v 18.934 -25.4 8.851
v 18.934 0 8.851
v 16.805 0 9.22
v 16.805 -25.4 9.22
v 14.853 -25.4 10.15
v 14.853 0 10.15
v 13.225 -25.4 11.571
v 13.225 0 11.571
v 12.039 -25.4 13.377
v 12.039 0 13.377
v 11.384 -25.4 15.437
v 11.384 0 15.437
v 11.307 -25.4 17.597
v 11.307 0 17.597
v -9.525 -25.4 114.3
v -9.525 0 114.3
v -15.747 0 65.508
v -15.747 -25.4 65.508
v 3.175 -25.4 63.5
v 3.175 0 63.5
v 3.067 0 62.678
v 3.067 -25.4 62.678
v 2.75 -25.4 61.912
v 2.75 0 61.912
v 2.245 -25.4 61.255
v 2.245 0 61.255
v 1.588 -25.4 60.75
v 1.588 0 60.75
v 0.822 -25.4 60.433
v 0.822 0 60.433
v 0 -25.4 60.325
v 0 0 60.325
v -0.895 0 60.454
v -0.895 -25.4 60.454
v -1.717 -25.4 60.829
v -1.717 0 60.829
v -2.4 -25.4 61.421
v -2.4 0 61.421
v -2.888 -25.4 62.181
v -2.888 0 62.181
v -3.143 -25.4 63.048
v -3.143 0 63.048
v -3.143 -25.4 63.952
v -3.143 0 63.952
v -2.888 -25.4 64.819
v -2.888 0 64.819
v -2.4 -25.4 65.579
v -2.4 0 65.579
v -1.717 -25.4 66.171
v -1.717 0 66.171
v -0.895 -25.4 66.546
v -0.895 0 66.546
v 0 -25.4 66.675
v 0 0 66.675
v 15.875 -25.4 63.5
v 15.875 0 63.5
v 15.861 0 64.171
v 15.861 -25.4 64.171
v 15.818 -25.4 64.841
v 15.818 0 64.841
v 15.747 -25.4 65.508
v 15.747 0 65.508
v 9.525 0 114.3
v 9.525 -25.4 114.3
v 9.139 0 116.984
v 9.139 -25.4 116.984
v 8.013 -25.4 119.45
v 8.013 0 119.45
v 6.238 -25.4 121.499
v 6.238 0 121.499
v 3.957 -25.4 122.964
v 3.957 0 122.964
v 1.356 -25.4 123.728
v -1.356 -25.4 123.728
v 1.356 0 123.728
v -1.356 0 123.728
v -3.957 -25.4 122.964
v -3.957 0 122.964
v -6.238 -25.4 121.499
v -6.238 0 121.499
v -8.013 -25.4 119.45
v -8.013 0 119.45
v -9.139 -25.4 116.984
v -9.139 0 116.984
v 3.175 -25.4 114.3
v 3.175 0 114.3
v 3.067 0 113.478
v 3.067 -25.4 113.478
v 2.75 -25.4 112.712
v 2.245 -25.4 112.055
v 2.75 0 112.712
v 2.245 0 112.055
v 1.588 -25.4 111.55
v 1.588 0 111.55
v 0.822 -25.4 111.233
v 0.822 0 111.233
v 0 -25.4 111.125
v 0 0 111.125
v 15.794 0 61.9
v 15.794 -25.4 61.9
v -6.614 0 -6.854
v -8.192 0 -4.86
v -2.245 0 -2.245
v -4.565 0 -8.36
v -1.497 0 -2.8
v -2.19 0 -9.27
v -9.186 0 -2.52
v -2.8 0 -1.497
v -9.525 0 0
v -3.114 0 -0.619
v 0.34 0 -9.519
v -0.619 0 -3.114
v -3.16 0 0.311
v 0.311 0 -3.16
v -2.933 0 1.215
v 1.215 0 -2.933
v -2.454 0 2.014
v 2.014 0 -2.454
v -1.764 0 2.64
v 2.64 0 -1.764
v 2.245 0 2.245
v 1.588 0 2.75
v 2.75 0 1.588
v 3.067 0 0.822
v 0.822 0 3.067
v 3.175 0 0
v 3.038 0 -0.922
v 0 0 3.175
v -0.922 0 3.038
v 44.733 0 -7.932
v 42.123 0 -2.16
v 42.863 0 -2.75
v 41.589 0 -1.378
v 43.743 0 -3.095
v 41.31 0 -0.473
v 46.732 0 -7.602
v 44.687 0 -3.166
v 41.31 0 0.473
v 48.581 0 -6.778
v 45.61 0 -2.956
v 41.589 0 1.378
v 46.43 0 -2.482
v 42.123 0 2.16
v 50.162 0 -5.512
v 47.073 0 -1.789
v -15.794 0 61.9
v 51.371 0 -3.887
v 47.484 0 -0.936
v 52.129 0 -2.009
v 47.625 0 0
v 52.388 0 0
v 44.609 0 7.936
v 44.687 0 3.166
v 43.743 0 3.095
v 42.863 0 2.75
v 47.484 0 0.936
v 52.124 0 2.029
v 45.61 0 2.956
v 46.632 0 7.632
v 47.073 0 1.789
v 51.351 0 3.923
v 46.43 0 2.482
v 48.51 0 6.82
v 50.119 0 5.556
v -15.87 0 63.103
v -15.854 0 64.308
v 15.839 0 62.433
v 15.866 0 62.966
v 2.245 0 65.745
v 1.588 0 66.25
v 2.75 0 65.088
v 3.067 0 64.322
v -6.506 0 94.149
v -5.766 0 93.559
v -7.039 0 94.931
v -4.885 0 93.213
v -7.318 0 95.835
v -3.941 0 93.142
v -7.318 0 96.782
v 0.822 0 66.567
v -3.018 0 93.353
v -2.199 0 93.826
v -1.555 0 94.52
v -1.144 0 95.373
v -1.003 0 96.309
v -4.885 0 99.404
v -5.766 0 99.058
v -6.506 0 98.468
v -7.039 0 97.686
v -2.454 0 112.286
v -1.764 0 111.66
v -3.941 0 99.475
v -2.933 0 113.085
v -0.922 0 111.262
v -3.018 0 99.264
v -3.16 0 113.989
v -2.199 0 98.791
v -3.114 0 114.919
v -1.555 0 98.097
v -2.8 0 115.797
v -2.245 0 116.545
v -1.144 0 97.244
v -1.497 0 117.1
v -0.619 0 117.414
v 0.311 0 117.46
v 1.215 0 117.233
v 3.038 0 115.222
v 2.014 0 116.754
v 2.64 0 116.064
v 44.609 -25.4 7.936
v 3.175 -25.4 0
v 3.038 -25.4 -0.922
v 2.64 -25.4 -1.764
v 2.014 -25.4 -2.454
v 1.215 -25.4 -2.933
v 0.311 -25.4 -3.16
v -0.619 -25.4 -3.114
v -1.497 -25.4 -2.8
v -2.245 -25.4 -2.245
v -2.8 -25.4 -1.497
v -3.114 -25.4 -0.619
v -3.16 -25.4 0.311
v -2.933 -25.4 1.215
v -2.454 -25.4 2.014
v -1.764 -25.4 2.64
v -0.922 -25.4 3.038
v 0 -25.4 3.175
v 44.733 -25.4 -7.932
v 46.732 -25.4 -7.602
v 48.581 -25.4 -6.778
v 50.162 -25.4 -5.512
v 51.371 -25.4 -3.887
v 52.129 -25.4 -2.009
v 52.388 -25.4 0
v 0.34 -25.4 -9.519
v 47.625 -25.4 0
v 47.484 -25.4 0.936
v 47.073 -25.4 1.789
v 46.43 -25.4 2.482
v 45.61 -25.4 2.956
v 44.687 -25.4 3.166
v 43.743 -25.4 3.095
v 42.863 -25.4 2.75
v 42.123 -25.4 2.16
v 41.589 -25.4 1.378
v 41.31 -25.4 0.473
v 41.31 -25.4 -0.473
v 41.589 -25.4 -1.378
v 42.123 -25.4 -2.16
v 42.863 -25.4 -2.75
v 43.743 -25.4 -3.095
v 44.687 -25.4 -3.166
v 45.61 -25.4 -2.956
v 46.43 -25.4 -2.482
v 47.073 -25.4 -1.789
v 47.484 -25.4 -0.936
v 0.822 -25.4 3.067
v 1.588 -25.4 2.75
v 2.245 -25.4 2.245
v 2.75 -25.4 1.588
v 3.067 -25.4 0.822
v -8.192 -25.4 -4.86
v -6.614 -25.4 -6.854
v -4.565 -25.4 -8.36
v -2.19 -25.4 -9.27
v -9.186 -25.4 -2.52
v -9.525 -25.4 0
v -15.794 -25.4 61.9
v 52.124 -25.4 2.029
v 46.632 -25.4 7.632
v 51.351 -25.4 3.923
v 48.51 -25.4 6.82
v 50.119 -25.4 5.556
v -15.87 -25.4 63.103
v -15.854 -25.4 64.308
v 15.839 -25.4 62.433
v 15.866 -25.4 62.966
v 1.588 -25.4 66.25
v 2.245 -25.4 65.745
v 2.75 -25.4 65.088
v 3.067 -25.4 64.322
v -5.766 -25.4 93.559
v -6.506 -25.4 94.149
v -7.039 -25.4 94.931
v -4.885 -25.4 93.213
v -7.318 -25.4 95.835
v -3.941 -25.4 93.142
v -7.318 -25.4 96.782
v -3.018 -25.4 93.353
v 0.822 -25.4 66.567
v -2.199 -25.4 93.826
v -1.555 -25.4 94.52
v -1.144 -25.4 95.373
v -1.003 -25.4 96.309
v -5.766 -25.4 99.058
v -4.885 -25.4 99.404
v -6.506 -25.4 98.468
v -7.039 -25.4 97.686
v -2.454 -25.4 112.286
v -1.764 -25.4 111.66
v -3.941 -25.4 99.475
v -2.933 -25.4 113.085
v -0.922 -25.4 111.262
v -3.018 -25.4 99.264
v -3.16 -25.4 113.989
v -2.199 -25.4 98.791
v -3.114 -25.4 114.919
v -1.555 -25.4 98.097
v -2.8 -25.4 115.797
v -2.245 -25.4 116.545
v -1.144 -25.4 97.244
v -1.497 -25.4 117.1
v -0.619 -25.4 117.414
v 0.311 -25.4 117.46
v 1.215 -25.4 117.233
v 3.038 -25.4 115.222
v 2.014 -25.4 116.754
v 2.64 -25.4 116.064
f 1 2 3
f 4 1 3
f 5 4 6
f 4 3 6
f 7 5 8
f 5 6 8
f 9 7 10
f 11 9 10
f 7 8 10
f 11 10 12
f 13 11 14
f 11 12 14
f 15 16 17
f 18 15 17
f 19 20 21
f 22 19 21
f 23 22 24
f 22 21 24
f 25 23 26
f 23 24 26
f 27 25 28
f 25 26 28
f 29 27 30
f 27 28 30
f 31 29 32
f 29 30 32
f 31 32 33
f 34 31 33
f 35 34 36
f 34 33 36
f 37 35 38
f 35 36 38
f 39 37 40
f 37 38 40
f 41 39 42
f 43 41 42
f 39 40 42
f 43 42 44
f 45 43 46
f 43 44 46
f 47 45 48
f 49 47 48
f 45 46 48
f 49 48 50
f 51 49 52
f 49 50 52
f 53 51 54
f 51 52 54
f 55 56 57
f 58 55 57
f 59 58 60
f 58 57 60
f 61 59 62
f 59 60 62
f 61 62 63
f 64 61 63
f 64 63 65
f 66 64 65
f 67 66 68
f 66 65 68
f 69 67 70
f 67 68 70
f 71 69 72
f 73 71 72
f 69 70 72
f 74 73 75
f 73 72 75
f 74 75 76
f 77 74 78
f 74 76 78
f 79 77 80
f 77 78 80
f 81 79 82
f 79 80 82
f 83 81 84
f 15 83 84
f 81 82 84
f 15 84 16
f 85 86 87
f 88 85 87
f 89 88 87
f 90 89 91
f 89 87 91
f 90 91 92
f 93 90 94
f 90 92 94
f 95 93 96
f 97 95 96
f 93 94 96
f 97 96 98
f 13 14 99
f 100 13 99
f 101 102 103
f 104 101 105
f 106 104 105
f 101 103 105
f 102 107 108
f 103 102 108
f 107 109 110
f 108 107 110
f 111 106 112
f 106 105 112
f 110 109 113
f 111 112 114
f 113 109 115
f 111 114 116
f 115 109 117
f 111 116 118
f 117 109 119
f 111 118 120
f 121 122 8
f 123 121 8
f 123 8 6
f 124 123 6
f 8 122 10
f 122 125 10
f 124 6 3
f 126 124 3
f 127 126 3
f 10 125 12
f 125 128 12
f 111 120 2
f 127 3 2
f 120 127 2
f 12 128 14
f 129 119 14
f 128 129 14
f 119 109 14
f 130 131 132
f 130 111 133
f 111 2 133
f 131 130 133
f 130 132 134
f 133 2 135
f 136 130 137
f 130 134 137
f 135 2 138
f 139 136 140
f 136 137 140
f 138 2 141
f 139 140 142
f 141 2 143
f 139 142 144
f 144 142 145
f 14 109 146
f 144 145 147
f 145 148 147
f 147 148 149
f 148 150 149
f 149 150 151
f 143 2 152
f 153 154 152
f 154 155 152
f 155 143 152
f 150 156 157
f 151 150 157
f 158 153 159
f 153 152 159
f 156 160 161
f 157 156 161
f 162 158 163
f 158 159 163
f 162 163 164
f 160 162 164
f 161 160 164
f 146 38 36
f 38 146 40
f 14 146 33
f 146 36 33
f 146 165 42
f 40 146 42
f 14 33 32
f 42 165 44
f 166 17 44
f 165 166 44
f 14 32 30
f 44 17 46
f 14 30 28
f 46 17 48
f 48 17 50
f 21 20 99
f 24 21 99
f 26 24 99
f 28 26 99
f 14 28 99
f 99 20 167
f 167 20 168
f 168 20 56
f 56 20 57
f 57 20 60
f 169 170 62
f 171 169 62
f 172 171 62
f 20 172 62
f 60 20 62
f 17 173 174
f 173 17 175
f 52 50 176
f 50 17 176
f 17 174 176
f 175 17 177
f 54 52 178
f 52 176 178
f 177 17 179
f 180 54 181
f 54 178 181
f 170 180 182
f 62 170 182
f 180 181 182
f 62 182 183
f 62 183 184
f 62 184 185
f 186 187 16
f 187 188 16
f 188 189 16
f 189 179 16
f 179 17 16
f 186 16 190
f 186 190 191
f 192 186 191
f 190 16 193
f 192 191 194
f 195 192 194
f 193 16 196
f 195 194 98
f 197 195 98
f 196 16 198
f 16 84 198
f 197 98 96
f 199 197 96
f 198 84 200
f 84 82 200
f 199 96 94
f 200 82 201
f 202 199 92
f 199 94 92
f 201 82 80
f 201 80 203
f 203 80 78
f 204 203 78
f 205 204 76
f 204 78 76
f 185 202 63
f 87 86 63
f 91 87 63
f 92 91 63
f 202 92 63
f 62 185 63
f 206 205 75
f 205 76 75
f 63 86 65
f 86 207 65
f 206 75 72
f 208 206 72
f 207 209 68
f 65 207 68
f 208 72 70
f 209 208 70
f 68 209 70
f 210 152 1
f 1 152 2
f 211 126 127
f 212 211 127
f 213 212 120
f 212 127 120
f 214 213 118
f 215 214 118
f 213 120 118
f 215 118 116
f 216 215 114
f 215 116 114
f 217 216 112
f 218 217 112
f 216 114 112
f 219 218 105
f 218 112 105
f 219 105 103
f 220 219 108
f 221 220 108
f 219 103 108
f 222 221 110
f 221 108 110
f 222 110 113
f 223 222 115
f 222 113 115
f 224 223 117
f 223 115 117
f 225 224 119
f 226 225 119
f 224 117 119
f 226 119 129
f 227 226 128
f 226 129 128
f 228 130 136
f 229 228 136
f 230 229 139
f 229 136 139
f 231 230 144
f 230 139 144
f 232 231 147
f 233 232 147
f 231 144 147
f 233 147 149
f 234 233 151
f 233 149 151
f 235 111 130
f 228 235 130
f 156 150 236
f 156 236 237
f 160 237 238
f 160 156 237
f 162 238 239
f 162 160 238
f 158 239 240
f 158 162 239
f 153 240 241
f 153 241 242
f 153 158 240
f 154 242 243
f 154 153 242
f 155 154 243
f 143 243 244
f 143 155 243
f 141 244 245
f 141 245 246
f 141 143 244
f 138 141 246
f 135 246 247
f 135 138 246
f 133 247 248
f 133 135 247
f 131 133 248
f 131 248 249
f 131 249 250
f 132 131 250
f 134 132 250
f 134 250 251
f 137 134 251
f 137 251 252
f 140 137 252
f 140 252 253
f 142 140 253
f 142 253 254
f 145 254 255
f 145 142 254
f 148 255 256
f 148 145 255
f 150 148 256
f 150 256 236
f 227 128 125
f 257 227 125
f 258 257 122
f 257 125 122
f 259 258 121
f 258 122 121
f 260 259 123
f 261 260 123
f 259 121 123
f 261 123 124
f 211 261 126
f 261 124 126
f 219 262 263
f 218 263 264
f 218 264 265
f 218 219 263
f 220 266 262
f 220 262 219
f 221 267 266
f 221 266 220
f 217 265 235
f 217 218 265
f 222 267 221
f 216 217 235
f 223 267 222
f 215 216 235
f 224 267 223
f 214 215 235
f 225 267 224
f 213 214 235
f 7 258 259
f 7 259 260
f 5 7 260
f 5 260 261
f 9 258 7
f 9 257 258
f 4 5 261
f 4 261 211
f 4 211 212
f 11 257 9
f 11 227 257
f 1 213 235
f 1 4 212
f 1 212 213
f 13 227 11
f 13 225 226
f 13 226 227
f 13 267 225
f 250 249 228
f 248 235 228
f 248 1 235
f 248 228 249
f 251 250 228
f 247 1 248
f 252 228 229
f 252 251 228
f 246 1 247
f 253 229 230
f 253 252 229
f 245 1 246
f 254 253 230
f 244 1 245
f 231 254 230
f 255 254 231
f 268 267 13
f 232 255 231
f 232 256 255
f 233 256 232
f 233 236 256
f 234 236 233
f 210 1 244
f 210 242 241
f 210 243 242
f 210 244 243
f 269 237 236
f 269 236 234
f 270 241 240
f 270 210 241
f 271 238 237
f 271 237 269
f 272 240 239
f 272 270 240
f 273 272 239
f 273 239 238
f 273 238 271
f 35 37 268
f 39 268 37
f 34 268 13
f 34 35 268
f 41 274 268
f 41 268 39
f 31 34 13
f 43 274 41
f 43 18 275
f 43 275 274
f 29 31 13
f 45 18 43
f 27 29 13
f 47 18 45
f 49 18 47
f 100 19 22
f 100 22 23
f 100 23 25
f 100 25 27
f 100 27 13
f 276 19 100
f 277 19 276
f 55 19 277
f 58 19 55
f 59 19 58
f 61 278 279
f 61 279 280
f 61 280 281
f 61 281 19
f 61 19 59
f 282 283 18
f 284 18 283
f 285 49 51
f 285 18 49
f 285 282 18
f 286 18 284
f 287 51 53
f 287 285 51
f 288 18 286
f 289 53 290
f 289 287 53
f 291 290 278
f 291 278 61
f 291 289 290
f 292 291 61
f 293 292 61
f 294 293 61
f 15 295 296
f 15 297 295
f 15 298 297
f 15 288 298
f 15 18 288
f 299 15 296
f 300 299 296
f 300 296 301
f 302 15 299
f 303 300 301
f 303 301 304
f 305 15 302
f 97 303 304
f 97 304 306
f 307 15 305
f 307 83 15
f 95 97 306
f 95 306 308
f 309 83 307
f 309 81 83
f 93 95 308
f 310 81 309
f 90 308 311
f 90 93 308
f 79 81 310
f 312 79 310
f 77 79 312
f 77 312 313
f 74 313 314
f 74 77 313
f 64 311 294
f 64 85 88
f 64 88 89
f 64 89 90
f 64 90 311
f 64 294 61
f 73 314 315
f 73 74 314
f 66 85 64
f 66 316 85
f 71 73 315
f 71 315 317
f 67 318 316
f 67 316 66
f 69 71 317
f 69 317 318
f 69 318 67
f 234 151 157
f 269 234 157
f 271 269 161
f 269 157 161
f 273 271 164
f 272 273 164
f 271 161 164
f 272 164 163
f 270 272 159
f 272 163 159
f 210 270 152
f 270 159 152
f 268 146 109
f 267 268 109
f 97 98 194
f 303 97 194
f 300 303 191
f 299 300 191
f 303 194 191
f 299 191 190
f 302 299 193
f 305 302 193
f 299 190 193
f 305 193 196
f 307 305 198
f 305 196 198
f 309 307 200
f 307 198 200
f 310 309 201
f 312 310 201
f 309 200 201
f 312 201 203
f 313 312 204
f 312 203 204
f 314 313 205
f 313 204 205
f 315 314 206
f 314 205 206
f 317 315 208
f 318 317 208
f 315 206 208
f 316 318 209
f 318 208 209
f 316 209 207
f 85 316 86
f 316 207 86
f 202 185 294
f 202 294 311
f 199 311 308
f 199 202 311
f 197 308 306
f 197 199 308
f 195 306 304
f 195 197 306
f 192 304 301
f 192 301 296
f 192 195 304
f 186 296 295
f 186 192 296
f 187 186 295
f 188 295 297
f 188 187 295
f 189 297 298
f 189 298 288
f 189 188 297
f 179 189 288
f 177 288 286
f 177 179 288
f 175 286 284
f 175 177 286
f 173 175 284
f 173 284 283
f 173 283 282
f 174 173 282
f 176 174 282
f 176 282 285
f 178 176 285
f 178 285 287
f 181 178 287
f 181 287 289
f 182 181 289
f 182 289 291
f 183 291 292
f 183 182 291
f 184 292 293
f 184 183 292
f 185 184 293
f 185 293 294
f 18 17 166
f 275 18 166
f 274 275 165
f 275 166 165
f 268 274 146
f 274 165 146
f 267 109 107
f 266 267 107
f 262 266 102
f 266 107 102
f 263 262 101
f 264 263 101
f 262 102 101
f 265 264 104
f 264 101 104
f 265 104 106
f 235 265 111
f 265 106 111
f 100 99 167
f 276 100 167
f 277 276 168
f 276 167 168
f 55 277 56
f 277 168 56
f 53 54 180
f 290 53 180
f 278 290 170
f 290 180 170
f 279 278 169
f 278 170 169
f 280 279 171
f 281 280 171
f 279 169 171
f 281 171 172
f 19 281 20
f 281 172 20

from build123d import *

# Parameters (mm, degrees)
F0_R     = 3.175
F1_DEPTH = 25.4


with BuildPart() as f1:
    # F0 (on Front) → F1 (new body)
    with BuildSketch(Plane.XZ):
        with BuildLine():
            ThreePointArc((9.525, 0), (6.7351920908, 6.7351920908), (0, 9.525))
            ThreePointArc((0, 9.525), (-6.7351920908, 6.7351920908), (-9.525, 0))
            ThreePointArc((-9.525, 0), (-6.6138274083, -6.8544082176), (0.3401783754, -9.5189234514))
            ThreePointArc((0.3401783754, -9.5189234514), (6.8544082176, -6.6138274083), (9.525, 0))
        make_face()
        with BuildLine():
            ThreePointArc((3.175, 0), (-2.2450640303, -2.2450640303), (0, 3.175))
            ThreePointArc((0, 3.175), (2.2450640303, 2.2450640303), (3.175, 0))
        make_face(mode=Mode.SUBTRACT)
        with BuildLine():
            ThreePointArc((-9.525, 0), (-6.7351920908, 6.7351920908), (0, 9.525))
            Line((0, 9.525), (0, 47.625))
            ThreePointArc((0, 47.625), (-10.644756084, 51.722700101), (-15.7942028036, 61.9003804205))
            Line((-15.7942028036, 61.9003804205), (-9.525, 0))
        make_face()
        with BuildLine():
            Line((0, 47.625), (0, 9.525))
            ThreePointArc((0, 9.525), (6.7351920908, 6.7351920908), (9.525, 0))
            ThreePointArc((9.525, 0), (6.8544082176, -6.6138274083), (0.3401783754, -9.5189234514))
            Line((0.3401783754, -9.5189234514), (44.7334821429, -7.9324362036))
            ThreePointArc((44.7334821429, -7.9324362036), (36.5127422872, -0.0620181515), (44.6094941417, 7.9358974205))
            Line((44.6094941417, 7.9358974205), (18.9338924558, 8.8505270449))
            ThreePointArc((18.9338924558, 8.8505270449), (13.2248772537, 11.5706407269), (11.3071823287, 17.5967770675))
            Line((11.3071823287, 17.5967770675), (15.7942028036, 61.9003804205))
            ThreePointArc((15.7942028036, 61.9003804205), (10.644756084, 51.722700101), (0, 47.625))
        make_face()
        with BuildLine():
            ThreePointArc((-15.7942028036, 61.9003804205), (-10.644756084, 51.722700101), (0, 47.625))
            Line((0, 47.625), (0, 60.325))
            ThreePointArc((0, 60.325), (-3.175, 63.5), (0, 66.675))
            Line((0, 66.675), (0, 79.375))
            ThreePointArc((0, 79.375), (-10.4912828548, 75.4142187767), (-15.7474569047, 65.5082893304))
            ThreePointArc((-15.7474569047, 65.5082893304), (-15.873667691, 63.7056672947), (-15.7942028036, 61.9003804205))
        make_face()
        with BuildLine():
            Line((0, 60.325), (0, 47.625))
            ThreePointArc((0, 47.625), (10.644756084, 51.722700101), (15.7942028036, 61.9003804205))
            ThreePointArc((15.7942028036, 61.9003804205), (15.8547878338, 62.6991705884), (15.875, 63.5))
            ThreePointArc((15.875, 63.5), (15.8430821396, 64.5061676396), (15.7474569047, 65.5082893304))
            ThreePointArc((15.7474569047, 65.5082893304), (10.4912828548, 75.4142187767), (0, 79.375))
            Line((0, 79.375), (0, 66.675))
            ThreePointArc((0, 66.675), (2.2450640303, 65.7450640303), (3.175, 63.5))
            ThreePointArc((3.175, 63.5), (2.2450640303, 61.2549359697), (0, 60.325))
        make_face()
        with BuildLine():
            Line((-9.525, 114.3), (-15.7474569047, 65.5082893304))
            ThreePointArc((-15.7474569047, 65.5082893304), (-10.4912828548, 75.4142187767), (0, 79.375))
            Line((0, 79.375), (0, 104.775))
            ThreePointArc((0, 104.775), (-6.7351920908, 107.5648079092), (-9.525, 114.3))
        make_face()
        with Locations((-4.1781016625, 96.3086113334)):
            Circle(F0_R, mode=Mode.SUBTRACT)
        with BuildLine():
            ThreePointArc((44.6094941417, 7.9358974205), (36.5127422872, -0.0620181515), (44.7334821429, -7.9324362036))
            ThreePointArc((44.7334821429, -7.9324362036), (50.1620069047, -5.5115227815), (52.3875, 0))
            ThreePointArc((52.3875, 0), (50.1187693109, 5.5559842287), (44.6094941417, 7.9358974205))
        make_face()
        with Locations((44.45, 0)):
            Circle(F0_R, mode=Mode.SUBTRACT)
        with BuildLine():
            Line((0, 104.775), (0, 79.375))
            ThreePointArc((0, 79.375), (10.4912828548, 75.4142187767), (15.7474569047, 65.5082893304))
            Line((15.7474569047, 65.5082893304), (9.525, 114.3))
            ThreePointArc((9.525, 114.3), (6.7351920908, 107.5648079092), (0, 104.775))
        make_face()
        with BuildLine():
            ThreePointArc((9.525, 114.3), (0, 123.825), (-9.525, 114.3))
            ThreePointArc((-9.525, 114.3), (-6.7351920908, 107.5648079092), (0, 104.775))
            ThreePointArc((0, 104.775), (6.7351920908, 107.5648079092), (9.525, 114.3))
        make_face()
        with BuildLine():
            ThreePointArc((3.175, 114.3), (2.2450640303, 112.0549359697), (0, 111.125))
            ThreePointArc((0, 111.125), (-2.2450640303, 116.5450640303), (3.175, 114.3))
        make_face(mode=Mode.SUBTRACT)
    extrude(amount=F1_DEPTH)


solid = f1.part
